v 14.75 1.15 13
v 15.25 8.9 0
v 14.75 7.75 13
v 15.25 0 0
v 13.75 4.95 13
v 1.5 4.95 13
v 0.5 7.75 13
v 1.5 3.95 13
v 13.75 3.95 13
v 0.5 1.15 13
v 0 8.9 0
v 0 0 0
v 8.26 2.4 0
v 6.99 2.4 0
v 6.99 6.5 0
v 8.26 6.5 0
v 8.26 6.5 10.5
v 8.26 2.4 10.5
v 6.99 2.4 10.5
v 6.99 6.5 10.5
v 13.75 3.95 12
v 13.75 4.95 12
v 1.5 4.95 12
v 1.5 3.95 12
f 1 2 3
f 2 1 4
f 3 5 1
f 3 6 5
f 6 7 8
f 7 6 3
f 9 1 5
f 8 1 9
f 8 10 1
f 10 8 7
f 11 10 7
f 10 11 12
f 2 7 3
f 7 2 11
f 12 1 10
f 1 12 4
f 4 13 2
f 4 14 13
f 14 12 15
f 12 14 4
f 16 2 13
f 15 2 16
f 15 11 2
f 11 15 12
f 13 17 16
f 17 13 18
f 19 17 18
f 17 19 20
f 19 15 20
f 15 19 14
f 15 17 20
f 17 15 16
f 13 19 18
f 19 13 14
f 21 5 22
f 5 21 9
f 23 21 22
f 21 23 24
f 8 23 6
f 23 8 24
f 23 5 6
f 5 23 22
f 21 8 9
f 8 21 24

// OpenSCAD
// This doesn't work with customizer :(
// The indicator line
//linestyle = "slot"; // ["slot", "raised", "none"]

// base dimensions
width=8.9;
length=15.25;

// top dimensions
topwidth=6.6;
toplength=14.25;

// height
height=13;

// slot in bottom
slotwidth=4.1;
slotlength=1.27;
slotdepth=10.5;

/* [hidden] */
point0=[0,0,0];
point1=[0,width,0];
point2=[length,width,0];
point3=[length,0,0];
point4=[(length-toplength)/2,(width-topwidth)/2,height];
point5=[(length-toplength)/2,width-(width-topwidth)/2,height];
point6=[length - (length-toplength)/2,width-(width-topwidth)/2,height];
point7=[length - (length-toplength)/2,(width-topwidth)/2,height];


difference() {
polyhedron(
points=[ point0, point1, point2, point3, point4, point5, point6, point7],
triangles= [ [0,2,1],[0,3,2], // cw bottom
		   [0,1,5],[0,5,4], // cw short 1
		   [0,4,7],[0,7,3], // cw wide 1
             [2,3,7],[2,7,6], // cw short 2
             [1,2,5],[2,6,5], // cw wide 2
             [4,5,6],[4,6,7] ] // cw top
);

// carve out line for fader slot.
translate([length/2-slotlength/2, width/2-slotwidth/2, 0])
cube([slotlength,slotwidth,slotdepth]);

// line in top, if a slot.
//	if (linestyle == "slot") {
		translate([(length-toplength)/2 + 1,(topwidth/2 + (width - topwidth)/2)-.5 ,height-1])
		cube([toplength-2,1,2]);
//	}
}


// line in top, if a raised line
//	if (linestyle == "raised") {
//		translate([(length-toplength)/2 + 1,(topwidth/2 + (width - topwidth)/2)-.5 ,height-1])
//		cube([toplength-2,1,2]);
//	}
